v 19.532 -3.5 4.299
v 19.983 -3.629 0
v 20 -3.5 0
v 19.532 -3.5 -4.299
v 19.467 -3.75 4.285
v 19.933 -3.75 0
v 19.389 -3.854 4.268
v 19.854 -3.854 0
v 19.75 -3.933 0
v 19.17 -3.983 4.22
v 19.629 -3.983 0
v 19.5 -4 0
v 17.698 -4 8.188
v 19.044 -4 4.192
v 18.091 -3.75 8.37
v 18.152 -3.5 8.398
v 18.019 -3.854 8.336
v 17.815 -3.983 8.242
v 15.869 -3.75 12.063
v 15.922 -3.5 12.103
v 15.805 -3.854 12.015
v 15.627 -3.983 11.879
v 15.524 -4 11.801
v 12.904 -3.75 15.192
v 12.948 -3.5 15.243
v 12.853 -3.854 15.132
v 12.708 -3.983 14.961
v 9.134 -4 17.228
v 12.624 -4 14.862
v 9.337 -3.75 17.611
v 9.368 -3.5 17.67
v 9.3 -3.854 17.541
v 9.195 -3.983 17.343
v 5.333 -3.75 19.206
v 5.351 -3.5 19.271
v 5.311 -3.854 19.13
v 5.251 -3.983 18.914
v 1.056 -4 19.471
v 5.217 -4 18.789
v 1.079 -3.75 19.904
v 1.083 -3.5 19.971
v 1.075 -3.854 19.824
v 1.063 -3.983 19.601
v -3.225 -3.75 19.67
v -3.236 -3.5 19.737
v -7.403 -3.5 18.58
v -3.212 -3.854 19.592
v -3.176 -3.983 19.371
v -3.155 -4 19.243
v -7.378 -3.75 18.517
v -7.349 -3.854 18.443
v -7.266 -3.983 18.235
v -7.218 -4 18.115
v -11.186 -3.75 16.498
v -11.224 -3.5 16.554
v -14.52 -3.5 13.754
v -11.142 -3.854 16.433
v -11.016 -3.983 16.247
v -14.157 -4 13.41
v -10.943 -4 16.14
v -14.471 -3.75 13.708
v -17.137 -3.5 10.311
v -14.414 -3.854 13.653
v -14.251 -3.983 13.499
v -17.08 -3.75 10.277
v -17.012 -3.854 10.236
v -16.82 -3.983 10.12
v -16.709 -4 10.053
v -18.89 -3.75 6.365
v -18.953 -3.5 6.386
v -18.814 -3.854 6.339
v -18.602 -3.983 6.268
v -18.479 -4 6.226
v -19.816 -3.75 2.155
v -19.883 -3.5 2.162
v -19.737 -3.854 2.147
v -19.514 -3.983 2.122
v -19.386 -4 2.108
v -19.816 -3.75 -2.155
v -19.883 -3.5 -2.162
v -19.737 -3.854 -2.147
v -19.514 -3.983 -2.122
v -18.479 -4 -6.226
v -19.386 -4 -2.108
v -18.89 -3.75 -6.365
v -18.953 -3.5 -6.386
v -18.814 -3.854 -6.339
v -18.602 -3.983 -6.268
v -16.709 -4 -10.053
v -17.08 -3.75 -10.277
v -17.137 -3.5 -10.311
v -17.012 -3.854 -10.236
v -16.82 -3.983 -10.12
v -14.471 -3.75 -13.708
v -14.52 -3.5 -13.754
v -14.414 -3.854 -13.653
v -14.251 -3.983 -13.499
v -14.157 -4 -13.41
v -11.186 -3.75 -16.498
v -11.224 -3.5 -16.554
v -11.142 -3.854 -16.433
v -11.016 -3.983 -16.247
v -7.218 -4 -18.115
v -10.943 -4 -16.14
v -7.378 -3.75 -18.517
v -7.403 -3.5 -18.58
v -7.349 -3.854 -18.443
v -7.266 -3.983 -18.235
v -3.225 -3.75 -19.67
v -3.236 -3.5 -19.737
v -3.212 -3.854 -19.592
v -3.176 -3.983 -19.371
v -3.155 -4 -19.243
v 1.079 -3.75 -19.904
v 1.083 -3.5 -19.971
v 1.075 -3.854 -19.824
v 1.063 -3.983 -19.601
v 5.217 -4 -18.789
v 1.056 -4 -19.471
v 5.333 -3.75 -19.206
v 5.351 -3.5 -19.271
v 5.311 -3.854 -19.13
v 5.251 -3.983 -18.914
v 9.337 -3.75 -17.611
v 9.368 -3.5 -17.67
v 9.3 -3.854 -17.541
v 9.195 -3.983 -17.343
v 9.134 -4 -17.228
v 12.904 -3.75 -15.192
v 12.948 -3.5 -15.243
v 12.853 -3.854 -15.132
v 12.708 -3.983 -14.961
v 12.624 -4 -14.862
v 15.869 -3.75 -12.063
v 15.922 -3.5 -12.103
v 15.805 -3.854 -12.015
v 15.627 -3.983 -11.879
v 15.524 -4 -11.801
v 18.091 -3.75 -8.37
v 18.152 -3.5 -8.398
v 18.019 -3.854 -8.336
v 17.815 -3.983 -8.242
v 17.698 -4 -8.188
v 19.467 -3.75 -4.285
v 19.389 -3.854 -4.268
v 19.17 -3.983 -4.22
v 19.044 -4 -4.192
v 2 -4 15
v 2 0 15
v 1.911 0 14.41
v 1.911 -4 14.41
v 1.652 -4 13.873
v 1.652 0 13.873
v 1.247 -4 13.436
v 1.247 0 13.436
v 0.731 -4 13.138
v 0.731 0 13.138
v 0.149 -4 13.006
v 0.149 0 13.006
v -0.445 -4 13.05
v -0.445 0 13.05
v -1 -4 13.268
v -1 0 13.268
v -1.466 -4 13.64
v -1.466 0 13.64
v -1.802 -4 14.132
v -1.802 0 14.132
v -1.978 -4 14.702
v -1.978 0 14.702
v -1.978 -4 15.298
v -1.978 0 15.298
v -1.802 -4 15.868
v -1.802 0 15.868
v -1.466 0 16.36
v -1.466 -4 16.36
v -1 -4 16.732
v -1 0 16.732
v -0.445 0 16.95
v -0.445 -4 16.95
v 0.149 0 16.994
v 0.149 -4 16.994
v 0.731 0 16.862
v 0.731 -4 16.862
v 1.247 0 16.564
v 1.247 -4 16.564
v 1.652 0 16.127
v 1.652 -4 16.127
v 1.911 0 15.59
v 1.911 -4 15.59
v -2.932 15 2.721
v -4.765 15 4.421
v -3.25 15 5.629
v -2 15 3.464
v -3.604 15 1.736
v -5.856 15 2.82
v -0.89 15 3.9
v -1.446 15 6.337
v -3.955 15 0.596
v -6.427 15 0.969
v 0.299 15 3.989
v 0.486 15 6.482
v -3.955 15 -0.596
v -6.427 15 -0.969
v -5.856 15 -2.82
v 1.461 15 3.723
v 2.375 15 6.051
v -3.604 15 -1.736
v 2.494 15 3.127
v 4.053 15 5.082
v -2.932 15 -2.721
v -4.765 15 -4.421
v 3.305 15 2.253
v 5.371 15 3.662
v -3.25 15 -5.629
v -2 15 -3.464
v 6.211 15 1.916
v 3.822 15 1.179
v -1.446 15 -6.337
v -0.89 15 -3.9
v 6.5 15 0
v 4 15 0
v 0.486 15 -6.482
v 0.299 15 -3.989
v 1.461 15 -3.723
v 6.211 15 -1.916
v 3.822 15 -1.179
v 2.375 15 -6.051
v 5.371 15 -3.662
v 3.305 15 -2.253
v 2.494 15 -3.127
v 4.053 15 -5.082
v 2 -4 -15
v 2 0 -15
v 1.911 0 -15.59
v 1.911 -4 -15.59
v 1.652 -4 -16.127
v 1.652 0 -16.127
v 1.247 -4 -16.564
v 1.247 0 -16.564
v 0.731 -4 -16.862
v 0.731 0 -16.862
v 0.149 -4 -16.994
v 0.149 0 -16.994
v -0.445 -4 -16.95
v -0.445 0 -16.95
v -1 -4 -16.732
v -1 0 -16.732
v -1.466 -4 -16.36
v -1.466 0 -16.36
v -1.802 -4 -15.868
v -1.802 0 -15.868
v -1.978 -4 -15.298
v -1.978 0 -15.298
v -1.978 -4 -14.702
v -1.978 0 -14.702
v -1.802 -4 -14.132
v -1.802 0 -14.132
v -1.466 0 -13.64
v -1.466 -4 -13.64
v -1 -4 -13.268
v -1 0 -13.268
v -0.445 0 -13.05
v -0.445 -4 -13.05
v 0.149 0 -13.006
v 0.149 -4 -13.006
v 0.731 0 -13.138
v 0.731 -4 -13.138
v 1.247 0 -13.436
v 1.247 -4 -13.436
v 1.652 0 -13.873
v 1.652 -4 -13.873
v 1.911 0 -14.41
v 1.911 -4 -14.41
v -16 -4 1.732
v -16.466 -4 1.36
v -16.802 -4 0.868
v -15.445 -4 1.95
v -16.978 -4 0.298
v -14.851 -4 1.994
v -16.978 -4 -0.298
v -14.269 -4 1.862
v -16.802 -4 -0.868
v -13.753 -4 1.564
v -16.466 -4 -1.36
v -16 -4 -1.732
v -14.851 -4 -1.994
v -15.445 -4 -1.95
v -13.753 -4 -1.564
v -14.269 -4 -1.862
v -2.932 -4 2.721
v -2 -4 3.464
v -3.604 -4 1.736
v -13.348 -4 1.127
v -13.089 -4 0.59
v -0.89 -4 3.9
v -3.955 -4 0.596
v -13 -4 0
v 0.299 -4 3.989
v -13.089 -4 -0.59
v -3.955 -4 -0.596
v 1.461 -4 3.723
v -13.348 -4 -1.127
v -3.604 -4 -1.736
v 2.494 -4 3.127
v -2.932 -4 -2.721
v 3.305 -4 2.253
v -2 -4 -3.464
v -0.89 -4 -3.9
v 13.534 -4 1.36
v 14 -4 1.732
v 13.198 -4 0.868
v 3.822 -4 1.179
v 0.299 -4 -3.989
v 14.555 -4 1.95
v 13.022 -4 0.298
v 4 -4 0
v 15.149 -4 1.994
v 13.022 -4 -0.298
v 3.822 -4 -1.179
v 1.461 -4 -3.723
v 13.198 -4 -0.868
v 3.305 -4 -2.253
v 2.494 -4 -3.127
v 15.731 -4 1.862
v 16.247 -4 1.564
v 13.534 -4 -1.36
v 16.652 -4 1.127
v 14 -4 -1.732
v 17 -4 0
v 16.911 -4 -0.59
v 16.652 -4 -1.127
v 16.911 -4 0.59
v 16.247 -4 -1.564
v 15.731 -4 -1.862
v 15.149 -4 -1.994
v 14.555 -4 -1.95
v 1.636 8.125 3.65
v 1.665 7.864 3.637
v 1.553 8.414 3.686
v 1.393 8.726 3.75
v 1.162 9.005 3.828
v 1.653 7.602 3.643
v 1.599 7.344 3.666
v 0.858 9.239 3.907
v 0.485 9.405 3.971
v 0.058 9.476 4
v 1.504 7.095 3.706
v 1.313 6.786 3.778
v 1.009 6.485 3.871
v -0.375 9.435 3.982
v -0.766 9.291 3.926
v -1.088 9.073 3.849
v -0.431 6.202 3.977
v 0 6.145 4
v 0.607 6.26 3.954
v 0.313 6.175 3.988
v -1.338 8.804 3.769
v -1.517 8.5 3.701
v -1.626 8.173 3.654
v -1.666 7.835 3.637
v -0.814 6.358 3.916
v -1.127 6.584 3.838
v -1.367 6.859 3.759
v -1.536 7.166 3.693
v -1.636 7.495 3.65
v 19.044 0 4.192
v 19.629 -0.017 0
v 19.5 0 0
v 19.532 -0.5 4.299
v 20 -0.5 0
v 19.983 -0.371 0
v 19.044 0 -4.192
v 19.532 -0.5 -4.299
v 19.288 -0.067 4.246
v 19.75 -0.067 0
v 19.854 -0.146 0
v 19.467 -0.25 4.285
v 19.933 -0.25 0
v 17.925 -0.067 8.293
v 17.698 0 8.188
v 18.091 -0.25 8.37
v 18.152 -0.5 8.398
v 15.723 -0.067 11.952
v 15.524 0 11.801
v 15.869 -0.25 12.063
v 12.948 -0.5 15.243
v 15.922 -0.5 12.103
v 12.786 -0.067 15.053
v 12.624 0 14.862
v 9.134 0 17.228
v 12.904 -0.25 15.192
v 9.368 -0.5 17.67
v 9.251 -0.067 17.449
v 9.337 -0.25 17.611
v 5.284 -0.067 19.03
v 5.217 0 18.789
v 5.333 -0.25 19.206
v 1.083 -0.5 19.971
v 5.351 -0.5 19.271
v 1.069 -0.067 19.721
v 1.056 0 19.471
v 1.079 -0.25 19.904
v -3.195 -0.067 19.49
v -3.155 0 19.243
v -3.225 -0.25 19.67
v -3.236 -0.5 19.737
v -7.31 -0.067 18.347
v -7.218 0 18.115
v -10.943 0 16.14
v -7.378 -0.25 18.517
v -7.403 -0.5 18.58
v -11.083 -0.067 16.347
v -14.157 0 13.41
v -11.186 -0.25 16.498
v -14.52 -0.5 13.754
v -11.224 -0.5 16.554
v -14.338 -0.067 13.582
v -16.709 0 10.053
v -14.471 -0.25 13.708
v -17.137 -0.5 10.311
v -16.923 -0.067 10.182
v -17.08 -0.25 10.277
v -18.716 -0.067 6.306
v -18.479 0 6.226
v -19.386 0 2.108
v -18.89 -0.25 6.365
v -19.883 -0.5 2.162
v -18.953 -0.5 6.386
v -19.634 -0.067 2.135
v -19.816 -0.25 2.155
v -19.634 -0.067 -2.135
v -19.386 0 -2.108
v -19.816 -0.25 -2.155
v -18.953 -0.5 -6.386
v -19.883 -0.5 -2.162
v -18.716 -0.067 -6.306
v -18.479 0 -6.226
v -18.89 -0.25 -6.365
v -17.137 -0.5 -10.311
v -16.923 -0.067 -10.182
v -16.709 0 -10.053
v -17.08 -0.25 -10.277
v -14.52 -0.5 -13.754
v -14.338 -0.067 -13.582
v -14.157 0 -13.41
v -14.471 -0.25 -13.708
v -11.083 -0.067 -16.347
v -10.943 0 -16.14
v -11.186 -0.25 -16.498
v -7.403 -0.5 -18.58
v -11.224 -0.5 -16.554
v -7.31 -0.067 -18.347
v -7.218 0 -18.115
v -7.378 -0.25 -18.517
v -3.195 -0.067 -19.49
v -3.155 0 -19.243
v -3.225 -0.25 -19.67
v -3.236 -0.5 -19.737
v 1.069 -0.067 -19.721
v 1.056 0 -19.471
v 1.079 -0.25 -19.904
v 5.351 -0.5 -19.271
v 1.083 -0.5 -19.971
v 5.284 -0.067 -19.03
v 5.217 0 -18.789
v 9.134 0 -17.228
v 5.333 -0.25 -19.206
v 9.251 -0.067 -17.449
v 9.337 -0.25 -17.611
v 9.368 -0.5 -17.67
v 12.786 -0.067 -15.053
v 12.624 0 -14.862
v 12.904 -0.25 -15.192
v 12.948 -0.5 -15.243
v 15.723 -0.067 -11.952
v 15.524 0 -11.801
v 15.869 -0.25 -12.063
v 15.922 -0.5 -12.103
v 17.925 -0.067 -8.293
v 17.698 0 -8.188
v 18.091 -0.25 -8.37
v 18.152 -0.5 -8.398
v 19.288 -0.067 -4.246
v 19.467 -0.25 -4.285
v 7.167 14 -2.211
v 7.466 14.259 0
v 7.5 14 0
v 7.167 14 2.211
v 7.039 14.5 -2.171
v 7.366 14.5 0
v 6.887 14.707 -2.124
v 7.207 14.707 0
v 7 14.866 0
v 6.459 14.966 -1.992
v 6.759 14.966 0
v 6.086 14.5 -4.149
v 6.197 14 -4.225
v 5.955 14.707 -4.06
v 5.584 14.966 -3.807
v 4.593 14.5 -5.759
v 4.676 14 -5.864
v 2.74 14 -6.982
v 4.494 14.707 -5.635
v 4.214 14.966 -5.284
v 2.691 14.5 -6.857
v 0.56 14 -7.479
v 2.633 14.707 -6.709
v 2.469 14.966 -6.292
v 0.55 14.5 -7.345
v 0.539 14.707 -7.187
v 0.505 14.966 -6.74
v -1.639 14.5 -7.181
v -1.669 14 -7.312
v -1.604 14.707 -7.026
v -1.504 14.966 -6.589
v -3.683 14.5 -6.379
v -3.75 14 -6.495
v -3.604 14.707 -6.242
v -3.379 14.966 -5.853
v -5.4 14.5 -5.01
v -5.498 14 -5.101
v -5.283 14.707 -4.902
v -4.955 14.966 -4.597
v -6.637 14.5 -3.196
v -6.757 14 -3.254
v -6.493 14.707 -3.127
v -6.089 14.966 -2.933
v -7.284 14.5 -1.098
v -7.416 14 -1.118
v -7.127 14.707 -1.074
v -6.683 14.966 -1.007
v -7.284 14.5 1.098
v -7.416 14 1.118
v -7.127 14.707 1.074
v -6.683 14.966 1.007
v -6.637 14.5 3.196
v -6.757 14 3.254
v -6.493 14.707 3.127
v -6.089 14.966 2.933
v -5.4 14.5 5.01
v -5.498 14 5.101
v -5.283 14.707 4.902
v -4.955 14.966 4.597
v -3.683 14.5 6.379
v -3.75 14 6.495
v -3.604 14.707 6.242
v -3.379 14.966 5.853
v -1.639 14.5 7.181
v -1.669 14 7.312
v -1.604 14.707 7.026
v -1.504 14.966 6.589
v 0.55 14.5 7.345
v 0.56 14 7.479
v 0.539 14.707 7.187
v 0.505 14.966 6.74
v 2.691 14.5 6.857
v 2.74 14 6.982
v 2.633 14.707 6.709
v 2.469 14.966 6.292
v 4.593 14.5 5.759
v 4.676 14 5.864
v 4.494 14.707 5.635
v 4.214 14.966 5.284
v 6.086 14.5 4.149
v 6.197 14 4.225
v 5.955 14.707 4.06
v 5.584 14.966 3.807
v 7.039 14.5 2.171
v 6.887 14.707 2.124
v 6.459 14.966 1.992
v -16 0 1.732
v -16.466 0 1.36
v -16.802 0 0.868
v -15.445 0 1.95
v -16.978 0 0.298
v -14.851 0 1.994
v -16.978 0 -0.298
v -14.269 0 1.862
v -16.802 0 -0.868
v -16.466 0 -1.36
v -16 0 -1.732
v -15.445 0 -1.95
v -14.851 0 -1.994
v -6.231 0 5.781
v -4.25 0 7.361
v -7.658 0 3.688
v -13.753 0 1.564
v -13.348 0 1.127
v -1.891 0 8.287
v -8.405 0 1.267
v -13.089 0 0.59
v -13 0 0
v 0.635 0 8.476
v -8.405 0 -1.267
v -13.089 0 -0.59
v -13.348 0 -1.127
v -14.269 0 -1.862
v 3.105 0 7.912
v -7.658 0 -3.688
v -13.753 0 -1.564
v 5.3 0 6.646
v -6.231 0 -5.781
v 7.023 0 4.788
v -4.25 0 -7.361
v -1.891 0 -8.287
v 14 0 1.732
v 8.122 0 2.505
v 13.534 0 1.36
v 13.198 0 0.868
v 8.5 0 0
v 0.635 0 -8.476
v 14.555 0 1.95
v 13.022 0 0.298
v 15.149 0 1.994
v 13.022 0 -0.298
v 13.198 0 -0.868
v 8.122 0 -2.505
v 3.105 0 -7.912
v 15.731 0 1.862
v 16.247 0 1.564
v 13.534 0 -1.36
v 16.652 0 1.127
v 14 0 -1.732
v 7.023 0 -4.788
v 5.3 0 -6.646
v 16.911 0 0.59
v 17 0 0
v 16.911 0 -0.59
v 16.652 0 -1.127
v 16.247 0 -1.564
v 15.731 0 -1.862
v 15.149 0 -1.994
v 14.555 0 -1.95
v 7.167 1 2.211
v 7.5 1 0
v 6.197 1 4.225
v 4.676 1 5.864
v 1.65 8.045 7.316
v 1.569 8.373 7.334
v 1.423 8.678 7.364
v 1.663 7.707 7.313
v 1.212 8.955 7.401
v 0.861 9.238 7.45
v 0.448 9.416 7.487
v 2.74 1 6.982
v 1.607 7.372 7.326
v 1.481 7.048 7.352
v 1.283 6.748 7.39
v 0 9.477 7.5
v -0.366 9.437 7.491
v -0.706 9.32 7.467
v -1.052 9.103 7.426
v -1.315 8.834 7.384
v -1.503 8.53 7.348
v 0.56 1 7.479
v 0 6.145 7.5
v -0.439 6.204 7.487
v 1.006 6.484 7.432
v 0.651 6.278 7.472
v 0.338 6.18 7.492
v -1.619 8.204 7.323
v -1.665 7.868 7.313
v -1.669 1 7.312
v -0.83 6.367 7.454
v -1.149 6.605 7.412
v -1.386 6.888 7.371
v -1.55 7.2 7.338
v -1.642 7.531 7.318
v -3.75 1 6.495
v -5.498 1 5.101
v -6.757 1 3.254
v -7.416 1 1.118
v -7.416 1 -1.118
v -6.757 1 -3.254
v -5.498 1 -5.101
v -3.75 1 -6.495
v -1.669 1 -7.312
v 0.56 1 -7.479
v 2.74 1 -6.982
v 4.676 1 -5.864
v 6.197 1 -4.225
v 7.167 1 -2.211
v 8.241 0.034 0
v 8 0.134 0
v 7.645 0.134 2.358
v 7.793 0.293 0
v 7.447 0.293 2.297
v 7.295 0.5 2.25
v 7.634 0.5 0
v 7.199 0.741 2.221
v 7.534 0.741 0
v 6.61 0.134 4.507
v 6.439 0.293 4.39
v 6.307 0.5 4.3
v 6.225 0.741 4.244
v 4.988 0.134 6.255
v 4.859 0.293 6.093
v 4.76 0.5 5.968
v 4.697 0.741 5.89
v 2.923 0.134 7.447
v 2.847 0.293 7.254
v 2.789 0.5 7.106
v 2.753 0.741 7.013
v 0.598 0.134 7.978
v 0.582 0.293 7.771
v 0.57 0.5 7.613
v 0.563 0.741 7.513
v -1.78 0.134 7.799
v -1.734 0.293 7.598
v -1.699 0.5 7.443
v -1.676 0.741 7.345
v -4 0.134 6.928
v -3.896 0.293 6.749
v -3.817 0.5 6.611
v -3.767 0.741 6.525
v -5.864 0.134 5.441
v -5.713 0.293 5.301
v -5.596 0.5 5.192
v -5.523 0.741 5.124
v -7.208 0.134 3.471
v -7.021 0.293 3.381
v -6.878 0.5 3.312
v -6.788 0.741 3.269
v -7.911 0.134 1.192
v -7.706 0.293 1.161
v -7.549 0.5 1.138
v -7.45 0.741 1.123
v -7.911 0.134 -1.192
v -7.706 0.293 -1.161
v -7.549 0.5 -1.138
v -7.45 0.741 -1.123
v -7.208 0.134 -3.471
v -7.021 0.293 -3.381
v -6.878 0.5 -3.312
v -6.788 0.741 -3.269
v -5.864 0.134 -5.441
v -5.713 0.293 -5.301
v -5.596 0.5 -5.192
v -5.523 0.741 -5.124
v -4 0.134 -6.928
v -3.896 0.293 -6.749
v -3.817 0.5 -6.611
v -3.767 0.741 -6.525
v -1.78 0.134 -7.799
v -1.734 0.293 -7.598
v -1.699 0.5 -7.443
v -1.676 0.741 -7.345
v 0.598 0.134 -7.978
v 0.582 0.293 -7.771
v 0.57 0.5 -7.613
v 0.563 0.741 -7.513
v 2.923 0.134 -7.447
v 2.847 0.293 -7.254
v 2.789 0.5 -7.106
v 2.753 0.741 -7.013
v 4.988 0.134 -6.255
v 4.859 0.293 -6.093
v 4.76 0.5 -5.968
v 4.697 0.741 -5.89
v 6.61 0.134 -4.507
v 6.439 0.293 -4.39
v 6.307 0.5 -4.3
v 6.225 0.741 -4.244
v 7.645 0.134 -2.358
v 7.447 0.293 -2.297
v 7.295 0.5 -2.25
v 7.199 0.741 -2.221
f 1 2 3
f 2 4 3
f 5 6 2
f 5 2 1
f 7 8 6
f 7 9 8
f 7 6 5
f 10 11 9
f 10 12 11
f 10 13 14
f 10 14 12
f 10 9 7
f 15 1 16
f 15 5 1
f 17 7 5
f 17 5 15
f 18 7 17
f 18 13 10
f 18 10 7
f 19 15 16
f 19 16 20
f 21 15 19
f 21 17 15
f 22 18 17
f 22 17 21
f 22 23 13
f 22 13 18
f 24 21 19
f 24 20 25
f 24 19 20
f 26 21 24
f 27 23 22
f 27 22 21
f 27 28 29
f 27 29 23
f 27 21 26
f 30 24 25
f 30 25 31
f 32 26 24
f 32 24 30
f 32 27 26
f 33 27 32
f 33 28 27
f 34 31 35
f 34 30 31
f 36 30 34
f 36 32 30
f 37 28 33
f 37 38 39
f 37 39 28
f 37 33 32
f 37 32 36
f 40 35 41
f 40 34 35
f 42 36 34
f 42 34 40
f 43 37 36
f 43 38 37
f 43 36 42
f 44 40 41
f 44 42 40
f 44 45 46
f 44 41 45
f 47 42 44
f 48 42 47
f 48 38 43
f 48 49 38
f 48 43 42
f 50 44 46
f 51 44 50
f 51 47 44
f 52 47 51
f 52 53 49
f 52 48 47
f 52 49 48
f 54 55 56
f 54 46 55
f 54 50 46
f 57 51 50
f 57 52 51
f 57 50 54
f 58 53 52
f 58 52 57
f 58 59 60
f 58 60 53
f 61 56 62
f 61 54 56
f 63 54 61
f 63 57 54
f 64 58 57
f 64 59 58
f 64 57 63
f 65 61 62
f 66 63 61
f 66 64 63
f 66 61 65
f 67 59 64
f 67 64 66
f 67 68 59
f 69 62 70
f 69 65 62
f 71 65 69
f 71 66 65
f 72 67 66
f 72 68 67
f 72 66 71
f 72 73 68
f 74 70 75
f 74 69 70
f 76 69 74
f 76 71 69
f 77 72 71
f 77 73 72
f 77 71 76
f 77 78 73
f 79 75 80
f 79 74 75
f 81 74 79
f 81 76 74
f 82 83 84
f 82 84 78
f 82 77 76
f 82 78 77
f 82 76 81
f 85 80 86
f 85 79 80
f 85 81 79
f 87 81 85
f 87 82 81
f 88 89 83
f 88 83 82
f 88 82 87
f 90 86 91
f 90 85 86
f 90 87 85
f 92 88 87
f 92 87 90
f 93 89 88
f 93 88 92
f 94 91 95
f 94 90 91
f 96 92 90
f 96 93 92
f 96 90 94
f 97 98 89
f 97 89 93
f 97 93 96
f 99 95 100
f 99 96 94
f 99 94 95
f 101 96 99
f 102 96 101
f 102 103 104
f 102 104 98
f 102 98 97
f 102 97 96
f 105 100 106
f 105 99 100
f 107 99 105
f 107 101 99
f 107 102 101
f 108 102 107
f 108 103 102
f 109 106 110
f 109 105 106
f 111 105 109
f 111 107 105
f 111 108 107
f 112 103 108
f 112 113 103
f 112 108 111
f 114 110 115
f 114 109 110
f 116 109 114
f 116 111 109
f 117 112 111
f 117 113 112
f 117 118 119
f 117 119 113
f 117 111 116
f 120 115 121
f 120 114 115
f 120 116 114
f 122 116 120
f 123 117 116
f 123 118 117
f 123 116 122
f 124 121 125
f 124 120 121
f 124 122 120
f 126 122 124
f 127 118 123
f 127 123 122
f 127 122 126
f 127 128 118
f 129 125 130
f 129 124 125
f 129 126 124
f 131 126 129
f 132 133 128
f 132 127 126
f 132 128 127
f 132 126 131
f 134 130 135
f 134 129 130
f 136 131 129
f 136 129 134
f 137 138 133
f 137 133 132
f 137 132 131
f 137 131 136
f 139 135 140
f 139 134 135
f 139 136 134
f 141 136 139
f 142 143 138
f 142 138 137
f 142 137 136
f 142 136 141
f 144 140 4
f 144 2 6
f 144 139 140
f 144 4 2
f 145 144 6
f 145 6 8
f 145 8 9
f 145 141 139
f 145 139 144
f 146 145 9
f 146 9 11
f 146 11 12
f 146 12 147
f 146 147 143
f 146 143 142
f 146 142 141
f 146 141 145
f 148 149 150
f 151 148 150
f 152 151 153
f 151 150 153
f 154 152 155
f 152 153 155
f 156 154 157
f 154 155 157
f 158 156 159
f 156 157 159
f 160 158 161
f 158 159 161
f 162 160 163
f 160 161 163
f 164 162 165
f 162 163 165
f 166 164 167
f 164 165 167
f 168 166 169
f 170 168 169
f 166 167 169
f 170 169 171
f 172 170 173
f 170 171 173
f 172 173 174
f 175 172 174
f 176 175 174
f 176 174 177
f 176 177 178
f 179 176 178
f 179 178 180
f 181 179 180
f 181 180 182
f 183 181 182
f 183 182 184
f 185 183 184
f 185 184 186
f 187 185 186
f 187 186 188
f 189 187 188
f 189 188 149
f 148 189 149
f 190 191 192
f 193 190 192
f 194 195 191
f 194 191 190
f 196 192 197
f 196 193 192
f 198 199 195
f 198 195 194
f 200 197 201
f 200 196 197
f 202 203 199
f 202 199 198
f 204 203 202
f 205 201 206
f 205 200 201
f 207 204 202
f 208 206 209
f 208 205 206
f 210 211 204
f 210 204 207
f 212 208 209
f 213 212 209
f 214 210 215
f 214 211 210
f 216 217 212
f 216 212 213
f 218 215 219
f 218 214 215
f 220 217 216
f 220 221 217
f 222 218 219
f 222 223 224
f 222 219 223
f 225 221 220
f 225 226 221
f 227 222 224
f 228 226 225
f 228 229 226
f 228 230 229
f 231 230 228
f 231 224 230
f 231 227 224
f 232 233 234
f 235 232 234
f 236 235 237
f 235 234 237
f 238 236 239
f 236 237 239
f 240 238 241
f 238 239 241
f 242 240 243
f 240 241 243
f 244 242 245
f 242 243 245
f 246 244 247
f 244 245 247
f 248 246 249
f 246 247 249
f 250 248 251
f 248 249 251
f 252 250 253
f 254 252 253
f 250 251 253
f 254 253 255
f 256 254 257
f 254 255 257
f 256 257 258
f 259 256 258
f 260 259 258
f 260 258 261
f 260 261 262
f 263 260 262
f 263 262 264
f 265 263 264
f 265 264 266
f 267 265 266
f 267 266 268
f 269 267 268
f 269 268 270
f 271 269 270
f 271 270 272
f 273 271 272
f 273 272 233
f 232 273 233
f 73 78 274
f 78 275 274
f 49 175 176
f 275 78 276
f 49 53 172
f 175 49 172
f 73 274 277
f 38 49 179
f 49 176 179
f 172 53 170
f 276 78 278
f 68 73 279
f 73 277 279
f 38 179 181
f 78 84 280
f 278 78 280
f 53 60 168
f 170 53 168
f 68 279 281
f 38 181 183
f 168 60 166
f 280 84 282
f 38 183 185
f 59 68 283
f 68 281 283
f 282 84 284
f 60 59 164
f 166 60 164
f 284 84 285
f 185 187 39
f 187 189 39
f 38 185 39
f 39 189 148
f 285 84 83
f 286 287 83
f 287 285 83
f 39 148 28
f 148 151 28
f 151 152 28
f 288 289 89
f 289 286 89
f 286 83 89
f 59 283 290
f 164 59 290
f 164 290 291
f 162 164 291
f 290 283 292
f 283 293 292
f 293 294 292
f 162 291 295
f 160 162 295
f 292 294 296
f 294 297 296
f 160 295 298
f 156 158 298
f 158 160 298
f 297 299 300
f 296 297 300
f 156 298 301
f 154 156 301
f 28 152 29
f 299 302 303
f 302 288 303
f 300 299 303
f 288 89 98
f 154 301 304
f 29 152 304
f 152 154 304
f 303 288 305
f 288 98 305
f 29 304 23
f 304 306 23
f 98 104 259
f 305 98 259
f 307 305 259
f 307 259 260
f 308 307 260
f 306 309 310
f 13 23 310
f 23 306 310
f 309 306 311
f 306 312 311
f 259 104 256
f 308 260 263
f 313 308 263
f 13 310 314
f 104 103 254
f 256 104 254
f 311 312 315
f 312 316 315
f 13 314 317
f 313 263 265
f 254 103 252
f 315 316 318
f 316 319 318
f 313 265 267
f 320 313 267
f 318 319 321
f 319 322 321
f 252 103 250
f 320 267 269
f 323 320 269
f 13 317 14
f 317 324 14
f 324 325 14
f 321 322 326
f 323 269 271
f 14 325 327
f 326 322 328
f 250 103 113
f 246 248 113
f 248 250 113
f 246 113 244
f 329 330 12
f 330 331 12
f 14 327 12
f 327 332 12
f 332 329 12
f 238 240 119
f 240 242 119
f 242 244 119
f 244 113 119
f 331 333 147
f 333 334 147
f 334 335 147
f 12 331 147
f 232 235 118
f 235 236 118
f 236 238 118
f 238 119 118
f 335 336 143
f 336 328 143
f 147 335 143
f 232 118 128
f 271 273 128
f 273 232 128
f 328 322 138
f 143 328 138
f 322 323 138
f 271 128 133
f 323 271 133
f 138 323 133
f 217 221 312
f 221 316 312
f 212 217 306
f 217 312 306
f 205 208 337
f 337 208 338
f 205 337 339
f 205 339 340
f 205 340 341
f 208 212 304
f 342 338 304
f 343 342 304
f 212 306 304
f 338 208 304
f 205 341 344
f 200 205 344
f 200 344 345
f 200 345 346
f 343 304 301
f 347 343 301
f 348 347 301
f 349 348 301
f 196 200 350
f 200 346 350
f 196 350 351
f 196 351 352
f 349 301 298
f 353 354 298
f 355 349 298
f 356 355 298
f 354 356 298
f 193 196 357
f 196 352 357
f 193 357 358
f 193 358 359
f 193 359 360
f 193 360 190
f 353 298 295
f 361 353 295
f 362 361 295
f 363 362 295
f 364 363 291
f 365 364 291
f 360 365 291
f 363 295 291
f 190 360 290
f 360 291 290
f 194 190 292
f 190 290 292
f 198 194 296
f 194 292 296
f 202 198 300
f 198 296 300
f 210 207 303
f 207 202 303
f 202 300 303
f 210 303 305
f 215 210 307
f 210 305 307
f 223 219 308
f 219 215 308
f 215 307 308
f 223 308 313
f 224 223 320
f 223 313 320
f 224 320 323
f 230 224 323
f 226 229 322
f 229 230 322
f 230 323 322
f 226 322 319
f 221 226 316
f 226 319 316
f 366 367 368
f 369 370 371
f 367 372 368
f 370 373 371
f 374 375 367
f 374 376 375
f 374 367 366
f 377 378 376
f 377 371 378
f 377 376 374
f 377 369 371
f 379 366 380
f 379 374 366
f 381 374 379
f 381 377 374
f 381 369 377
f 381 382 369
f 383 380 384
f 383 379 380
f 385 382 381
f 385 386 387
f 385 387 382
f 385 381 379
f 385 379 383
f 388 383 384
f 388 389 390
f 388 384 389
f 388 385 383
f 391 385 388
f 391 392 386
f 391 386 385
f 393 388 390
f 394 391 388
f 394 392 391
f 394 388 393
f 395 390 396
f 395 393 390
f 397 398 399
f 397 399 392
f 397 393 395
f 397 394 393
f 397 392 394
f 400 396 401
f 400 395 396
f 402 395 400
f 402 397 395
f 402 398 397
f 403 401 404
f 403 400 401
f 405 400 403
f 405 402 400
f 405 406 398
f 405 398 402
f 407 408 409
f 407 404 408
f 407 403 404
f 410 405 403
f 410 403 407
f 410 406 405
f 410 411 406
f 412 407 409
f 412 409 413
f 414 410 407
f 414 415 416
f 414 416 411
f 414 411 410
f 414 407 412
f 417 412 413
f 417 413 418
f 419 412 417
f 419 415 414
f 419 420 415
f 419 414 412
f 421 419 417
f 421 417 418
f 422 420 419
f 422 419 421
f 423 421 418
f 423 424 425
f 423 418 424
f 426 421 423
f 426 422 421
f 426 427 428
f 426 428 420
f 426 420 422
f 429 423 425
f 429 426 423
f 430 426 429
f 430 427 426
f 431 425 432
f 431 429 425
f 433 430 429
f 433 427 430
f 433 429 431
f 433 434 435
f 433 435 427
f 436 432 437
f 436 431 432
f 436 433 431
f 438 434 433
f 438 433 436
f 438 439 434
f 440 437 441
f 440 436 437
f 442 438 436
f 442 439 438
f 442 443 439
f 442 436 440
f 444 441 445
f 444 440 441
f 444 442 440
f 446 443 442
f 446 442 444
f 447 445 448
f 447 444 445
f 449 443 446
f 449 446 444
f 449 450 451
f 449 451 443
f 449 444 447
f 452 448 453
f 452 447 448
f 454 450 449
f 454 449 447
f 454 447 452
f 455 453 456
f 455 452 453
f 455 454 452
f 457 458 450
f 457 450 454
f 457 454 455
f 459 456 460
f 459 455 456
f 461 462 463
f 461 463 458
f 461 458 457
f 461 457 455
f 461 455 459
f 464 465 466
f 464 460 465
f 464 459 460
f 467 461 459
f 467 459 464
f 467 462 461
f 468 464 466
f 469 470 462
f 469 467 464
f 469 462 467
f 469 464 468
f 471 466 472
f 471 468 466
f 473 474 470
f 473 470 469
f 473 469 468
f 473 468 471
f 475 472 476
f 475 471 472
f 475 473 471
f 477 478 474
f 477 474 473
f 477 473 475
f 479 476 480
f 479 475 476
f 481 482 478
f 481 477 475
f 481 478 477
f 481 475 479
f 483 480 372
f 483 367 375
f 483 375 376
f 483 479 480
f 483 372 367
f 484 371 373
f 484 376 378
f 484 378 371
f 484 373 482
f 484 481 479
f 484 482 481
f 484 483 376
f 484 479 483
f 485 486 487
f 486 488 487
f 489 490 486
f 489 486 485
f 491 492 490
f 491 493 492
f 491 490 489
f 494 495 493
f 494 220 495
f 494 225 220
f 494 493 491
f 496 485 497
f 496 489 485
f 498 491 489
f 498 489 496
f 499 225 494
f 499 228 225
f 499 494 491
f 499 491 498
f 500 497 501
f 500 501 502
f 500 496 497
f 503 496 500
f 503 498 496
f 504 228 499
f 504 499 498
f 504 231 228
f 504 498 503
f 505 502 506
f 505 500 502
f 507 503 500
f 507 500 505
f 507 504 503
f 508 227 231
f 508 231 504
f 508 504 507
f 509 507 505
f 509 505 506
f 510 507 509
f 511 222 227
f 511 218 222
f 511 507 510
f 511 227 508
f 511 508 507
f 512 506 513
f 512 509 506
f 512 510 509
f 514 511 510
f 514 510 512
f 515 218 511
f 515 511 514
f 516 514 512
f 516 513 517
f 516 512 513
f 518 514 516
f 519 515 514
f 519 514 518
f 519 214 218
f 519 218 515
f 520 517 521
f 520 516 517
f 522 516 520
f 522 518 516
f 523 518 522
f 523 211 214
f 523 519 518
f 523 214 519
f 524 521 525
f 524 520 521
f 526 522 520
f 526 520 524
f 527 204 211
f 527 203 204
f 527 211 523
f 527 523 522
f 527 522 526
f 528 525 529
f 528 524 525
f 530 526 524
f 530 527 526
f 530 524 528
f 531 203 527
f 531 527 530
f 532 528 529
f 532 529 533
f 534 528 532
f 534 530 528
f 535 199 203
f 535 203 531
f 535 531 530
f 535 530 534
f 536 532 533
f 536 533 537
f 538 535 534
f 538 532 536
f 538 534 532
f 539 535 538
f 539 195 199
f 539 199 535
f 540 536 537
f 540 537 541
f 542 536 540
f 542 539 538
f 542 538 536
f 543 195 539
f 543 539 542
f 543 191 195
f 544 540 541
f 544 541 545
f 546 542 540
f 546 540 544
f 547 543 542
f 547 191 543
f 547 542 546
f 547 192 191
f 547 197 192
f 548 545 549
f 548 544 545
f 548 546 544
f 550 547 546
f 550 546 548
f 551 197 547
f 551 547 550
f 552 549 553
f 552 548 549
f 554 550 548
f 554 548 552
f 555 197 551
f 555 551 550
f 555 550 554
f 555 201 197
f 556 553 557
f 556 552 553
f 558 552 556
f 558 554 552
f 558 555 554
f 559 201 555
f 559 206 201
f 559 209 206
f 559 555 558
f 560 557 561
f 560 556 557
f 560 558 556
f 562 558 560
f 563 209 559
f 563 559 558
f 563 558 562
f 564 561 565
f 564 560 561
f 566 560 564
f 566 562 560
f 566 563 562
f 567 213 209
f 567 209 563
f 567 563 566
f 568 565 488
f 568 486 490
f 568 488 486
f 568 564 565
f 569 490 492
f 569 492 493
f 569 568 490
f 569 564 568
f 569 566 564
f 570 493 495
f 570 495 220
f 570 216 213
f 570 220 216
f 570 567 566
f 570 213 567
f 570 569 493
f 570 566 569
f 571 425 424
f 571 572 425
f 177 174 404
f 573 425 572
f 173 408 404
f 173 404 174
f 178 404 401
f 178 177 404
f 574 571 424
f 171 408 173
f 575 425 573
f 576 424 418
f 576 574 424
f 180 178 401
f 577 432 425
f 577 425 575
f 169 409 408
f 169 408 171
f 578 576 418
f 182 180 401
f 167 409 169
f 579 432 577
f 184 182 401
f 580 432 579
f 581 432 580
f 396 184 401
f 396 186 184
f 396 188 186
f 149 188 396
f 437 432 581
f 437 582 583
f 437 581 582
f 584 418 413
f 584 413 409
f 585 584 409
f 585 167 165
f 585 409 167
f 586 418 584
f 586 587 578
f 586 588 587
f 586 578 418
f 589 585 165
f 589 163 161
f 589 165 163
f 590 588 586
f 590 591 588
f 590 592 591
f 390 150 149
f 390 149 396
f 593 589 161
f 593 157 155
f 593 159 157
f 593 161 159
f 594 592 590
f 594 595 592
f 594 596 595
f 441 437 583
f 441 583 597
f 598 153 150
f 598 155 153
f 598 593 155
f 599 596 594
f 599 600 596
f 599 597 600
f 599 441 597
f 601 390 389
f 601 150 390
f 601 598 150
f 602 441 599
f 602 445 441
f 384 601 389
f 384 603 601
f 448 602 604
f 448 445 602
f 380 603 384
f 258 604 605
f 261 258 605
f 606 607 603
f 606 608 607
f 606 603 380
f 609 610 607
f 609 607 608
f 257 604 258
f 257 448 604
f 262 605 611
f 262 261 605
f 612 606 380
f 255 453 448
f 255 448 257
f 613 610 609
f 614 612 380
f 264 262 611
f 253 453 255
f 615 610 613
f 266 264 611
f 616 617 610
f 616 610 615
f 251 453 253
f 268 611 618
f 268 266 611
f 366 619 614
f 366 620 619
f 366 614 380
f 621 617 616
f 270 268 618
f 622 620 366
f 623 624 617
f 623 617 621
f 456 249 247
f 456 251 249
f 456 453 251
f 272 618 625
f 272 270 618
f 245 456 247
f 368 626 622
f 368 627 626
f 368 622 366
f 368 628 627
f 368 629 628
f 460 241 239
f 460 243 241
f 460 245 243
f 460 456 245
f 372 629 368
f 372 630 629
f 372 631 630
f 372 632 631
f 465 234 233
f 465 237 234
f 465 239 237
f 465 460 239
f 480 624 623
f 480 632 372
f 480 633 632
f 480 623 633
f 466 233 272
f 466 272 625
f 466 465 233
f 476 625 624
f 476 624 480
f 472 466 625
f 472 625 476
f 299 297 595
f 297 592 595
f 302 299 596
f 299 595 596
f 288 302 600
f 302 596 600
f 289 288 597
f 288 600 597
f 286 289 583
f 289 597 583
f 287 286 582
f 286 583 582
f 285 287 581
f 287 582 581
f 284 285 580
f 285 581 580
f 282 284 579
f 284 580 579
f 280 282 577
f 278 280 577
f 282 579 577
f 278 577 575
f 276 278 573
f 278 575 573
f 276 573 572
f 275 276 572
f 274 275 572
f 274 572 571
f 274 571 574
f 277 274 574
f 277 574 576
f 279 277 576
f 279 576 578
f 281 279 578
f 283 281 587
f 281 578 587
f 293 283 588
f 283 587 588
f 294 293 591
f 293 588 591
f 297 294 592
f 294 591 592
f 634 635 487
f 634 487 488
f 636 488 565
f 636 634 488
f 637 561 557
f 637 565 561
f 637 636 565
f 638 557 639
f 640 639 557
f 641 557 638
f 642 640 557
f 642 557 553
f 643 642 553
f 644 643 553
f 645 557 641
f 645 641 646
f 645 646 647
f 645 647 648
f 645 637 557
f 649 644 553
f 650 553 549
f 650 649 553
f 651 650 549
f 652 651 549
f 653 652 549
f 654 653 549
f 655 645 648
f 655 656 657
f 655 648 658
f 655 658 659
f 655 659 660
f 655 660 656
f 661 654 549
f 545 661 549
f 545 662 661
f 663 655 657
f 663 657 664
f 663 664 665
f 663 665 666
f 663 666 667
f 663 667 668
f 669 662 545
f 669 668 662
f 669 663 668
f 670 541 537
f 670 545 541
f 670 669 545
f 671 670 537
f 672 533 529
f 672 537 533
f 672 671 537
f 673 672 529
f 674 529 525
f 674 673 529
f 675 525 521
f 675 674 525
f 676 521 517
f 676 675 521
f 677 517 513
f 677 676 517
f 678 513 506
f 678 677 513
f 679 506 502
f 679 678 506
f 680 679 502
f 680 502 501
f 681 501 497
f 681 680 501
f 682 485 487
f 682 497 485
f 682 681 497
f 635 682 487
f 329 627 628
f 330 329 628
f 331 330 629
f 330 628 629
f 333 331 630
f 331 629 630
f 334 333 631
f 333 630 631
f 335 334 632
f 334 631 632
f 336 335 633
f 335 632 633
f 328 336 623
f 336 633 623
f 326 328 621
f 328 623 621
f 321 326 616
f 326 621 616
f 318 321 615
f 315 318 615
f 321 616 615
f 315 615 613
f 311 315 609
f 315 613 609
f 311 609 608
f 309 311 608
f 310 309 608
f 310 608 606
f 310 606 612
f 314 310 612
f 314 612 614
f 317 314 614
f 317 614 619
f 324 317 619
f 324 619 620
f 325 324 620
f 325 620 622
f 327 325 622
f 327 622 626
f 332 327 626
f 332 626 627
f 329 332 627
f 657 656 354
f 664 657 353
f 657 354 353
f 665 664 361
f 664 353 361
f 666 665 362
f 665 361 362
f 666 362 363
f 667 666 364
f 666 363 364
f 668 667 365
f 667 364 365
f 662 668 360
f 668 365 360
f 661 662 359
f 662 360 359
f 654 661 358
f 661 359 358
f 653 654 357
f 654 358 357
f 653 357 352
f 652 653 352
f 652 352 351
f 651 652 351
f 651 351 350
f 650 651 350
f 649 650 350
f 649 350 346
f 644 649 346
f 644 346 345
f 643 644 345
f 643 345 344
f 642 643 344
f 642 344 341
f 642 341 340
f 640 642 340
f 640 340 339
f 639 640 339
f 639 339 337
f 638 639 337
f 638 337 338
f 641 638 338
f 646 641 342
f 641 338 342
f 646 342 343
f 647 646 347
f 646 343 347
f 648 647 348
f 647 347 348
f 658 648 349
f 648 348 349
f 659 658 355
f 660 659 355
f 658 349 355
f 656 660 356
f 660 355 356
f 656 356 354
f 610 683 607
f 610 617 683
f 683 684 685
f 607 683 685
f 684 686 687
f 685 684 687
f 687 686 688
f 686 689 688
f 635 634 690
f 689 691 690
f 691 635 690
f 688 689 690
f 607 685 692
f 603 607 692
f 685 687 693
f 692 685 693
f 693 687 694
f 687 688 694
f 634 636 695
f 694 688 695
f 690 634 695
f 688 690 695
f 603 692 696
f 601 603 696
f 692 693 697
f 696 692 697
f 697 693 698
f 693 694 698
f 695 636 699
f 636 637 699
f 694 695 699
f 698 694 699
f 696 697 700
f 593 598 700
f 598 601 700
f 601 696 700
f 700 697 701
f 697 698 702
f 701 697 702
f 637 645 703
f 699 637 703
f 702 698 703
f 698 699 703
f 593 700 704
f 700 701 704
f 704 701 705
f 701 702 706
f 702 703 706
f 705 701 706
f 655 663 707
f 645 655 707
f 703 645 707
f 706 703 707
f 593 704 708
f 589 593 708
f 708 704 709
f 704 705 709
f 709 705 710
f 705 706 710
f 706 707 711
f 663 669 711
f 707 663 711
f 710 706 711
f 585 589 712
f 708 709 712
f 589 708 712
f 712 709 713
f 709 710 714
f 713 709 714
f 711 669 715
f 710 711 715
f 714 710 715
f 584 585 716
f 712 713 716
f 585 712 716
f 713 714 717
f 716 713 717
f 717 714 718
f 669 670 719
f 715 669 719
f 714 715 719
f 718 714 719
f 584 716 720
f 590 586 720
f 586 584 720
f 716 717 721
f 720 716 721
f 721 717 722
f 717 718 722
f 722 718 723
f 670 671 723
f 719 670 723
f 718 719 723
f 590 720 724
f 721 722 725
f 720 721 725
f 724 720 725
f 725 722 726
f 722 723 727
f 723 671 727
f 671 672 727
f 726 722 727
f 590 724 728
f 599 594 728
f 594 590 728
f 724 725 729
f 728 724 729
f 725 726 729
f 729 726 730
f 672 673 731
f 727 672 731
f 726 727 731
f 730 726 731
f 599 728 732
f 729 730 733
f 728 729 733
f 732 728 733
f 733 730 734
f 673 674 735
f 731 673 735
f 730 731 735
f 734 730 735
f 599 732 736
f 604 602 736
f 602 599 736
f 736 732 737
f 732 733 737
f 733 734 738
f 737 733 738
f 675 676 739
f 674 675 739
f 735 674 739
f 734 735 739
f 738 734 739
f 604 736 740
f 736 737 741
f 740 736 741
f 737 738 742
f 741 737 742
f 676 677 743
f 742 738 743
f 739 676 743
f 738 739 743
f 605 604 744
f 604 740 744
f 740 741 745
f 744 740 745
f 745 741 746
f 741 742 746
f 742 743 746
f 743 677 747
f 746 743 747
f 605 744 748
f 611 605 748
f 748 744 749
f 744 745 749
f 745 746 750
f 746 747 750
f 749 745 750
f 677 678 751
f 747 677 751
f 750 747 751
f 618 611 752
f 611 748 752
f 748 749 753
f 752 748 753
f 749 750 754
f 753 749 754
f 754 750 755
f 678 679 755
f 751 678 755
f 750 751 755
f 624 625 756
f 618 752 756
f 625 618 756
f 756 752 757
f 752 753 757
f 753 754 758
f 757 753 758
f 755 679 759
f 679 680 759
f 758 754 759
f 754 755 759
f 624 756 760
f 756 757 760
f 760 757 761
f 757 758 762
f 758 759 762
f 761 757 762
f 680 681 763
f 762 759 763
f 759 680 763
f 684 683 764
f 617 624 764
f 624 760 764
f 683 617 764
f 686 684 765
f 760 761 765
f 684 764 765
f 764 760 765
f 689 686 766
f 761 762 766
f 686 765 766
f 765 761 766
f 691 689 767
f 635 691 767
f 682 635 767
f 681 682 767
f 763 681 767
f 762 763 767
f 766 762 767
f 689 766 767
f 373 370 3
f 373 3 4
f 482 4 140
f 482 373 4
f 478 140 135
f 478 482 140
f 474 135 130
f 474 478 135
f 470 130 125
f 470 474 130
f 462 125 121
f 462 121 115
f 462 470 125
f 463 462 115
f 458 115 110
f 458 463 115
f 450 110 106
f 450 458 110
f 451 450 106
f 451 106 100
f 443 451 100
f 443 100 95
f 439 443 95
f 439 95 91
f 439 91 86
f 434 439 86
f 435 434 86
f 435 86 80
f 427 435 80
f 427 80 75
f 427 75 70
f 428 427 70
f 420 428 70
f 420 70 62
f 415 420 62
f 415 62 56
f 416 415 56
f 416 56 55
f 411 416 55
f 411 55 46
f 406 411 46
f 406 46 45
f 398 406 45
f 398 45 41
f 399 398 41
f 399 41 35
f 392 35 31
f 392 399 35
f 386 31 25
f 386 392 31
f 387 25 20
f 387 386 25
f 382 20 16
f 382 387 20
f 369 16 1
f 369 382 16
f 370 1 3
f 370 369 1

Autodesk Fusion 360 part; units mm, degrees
sketch "Sketch1" plane through (0, 0, 0) normal (0, 1, 0) x (1, 0, 0)
  circle A0 centre (0, 0) radius 4
  circle A1 centre (0, 0) radius 7.5
  circle A2 centre (0, 0) radius 20
  circle A3 centre (0, 0) radius 15 construction
  circle A4 centre (0, -15) radius 2
  circle A5 centre (15, 0) radius 2
  circle A6 centre (0, 15) radius 2
  circle A7 centre (-15, 0) radius 2
  dimension "d1" = 8
  dimension "d2" = 15
  dimension "d3" = 40
  dimension "d4" = 4
  dimension "d6" = 360
extrude "Extrude1" add sketch "Sketch1" along normal blind 15 contours A1
extrude "Extrude2" add sketch "Sketch1" against normal blind 4 contours A1 | A2
fillet "Fillet1" radius 0.5 2 edges at (-18.6465, -4, -7.2323) (-18.6465, 0, 7.2323)
fillet "Fillet2" radius 1 2 edges at (-6.9925, 0, 2.7121) (-6.9925, 15, 2.7121)
hole "Hole1" at (0, 7.8114, 7.5) direction (0, 0, -1) diameter 3.332 depth 8 tip angle 118
